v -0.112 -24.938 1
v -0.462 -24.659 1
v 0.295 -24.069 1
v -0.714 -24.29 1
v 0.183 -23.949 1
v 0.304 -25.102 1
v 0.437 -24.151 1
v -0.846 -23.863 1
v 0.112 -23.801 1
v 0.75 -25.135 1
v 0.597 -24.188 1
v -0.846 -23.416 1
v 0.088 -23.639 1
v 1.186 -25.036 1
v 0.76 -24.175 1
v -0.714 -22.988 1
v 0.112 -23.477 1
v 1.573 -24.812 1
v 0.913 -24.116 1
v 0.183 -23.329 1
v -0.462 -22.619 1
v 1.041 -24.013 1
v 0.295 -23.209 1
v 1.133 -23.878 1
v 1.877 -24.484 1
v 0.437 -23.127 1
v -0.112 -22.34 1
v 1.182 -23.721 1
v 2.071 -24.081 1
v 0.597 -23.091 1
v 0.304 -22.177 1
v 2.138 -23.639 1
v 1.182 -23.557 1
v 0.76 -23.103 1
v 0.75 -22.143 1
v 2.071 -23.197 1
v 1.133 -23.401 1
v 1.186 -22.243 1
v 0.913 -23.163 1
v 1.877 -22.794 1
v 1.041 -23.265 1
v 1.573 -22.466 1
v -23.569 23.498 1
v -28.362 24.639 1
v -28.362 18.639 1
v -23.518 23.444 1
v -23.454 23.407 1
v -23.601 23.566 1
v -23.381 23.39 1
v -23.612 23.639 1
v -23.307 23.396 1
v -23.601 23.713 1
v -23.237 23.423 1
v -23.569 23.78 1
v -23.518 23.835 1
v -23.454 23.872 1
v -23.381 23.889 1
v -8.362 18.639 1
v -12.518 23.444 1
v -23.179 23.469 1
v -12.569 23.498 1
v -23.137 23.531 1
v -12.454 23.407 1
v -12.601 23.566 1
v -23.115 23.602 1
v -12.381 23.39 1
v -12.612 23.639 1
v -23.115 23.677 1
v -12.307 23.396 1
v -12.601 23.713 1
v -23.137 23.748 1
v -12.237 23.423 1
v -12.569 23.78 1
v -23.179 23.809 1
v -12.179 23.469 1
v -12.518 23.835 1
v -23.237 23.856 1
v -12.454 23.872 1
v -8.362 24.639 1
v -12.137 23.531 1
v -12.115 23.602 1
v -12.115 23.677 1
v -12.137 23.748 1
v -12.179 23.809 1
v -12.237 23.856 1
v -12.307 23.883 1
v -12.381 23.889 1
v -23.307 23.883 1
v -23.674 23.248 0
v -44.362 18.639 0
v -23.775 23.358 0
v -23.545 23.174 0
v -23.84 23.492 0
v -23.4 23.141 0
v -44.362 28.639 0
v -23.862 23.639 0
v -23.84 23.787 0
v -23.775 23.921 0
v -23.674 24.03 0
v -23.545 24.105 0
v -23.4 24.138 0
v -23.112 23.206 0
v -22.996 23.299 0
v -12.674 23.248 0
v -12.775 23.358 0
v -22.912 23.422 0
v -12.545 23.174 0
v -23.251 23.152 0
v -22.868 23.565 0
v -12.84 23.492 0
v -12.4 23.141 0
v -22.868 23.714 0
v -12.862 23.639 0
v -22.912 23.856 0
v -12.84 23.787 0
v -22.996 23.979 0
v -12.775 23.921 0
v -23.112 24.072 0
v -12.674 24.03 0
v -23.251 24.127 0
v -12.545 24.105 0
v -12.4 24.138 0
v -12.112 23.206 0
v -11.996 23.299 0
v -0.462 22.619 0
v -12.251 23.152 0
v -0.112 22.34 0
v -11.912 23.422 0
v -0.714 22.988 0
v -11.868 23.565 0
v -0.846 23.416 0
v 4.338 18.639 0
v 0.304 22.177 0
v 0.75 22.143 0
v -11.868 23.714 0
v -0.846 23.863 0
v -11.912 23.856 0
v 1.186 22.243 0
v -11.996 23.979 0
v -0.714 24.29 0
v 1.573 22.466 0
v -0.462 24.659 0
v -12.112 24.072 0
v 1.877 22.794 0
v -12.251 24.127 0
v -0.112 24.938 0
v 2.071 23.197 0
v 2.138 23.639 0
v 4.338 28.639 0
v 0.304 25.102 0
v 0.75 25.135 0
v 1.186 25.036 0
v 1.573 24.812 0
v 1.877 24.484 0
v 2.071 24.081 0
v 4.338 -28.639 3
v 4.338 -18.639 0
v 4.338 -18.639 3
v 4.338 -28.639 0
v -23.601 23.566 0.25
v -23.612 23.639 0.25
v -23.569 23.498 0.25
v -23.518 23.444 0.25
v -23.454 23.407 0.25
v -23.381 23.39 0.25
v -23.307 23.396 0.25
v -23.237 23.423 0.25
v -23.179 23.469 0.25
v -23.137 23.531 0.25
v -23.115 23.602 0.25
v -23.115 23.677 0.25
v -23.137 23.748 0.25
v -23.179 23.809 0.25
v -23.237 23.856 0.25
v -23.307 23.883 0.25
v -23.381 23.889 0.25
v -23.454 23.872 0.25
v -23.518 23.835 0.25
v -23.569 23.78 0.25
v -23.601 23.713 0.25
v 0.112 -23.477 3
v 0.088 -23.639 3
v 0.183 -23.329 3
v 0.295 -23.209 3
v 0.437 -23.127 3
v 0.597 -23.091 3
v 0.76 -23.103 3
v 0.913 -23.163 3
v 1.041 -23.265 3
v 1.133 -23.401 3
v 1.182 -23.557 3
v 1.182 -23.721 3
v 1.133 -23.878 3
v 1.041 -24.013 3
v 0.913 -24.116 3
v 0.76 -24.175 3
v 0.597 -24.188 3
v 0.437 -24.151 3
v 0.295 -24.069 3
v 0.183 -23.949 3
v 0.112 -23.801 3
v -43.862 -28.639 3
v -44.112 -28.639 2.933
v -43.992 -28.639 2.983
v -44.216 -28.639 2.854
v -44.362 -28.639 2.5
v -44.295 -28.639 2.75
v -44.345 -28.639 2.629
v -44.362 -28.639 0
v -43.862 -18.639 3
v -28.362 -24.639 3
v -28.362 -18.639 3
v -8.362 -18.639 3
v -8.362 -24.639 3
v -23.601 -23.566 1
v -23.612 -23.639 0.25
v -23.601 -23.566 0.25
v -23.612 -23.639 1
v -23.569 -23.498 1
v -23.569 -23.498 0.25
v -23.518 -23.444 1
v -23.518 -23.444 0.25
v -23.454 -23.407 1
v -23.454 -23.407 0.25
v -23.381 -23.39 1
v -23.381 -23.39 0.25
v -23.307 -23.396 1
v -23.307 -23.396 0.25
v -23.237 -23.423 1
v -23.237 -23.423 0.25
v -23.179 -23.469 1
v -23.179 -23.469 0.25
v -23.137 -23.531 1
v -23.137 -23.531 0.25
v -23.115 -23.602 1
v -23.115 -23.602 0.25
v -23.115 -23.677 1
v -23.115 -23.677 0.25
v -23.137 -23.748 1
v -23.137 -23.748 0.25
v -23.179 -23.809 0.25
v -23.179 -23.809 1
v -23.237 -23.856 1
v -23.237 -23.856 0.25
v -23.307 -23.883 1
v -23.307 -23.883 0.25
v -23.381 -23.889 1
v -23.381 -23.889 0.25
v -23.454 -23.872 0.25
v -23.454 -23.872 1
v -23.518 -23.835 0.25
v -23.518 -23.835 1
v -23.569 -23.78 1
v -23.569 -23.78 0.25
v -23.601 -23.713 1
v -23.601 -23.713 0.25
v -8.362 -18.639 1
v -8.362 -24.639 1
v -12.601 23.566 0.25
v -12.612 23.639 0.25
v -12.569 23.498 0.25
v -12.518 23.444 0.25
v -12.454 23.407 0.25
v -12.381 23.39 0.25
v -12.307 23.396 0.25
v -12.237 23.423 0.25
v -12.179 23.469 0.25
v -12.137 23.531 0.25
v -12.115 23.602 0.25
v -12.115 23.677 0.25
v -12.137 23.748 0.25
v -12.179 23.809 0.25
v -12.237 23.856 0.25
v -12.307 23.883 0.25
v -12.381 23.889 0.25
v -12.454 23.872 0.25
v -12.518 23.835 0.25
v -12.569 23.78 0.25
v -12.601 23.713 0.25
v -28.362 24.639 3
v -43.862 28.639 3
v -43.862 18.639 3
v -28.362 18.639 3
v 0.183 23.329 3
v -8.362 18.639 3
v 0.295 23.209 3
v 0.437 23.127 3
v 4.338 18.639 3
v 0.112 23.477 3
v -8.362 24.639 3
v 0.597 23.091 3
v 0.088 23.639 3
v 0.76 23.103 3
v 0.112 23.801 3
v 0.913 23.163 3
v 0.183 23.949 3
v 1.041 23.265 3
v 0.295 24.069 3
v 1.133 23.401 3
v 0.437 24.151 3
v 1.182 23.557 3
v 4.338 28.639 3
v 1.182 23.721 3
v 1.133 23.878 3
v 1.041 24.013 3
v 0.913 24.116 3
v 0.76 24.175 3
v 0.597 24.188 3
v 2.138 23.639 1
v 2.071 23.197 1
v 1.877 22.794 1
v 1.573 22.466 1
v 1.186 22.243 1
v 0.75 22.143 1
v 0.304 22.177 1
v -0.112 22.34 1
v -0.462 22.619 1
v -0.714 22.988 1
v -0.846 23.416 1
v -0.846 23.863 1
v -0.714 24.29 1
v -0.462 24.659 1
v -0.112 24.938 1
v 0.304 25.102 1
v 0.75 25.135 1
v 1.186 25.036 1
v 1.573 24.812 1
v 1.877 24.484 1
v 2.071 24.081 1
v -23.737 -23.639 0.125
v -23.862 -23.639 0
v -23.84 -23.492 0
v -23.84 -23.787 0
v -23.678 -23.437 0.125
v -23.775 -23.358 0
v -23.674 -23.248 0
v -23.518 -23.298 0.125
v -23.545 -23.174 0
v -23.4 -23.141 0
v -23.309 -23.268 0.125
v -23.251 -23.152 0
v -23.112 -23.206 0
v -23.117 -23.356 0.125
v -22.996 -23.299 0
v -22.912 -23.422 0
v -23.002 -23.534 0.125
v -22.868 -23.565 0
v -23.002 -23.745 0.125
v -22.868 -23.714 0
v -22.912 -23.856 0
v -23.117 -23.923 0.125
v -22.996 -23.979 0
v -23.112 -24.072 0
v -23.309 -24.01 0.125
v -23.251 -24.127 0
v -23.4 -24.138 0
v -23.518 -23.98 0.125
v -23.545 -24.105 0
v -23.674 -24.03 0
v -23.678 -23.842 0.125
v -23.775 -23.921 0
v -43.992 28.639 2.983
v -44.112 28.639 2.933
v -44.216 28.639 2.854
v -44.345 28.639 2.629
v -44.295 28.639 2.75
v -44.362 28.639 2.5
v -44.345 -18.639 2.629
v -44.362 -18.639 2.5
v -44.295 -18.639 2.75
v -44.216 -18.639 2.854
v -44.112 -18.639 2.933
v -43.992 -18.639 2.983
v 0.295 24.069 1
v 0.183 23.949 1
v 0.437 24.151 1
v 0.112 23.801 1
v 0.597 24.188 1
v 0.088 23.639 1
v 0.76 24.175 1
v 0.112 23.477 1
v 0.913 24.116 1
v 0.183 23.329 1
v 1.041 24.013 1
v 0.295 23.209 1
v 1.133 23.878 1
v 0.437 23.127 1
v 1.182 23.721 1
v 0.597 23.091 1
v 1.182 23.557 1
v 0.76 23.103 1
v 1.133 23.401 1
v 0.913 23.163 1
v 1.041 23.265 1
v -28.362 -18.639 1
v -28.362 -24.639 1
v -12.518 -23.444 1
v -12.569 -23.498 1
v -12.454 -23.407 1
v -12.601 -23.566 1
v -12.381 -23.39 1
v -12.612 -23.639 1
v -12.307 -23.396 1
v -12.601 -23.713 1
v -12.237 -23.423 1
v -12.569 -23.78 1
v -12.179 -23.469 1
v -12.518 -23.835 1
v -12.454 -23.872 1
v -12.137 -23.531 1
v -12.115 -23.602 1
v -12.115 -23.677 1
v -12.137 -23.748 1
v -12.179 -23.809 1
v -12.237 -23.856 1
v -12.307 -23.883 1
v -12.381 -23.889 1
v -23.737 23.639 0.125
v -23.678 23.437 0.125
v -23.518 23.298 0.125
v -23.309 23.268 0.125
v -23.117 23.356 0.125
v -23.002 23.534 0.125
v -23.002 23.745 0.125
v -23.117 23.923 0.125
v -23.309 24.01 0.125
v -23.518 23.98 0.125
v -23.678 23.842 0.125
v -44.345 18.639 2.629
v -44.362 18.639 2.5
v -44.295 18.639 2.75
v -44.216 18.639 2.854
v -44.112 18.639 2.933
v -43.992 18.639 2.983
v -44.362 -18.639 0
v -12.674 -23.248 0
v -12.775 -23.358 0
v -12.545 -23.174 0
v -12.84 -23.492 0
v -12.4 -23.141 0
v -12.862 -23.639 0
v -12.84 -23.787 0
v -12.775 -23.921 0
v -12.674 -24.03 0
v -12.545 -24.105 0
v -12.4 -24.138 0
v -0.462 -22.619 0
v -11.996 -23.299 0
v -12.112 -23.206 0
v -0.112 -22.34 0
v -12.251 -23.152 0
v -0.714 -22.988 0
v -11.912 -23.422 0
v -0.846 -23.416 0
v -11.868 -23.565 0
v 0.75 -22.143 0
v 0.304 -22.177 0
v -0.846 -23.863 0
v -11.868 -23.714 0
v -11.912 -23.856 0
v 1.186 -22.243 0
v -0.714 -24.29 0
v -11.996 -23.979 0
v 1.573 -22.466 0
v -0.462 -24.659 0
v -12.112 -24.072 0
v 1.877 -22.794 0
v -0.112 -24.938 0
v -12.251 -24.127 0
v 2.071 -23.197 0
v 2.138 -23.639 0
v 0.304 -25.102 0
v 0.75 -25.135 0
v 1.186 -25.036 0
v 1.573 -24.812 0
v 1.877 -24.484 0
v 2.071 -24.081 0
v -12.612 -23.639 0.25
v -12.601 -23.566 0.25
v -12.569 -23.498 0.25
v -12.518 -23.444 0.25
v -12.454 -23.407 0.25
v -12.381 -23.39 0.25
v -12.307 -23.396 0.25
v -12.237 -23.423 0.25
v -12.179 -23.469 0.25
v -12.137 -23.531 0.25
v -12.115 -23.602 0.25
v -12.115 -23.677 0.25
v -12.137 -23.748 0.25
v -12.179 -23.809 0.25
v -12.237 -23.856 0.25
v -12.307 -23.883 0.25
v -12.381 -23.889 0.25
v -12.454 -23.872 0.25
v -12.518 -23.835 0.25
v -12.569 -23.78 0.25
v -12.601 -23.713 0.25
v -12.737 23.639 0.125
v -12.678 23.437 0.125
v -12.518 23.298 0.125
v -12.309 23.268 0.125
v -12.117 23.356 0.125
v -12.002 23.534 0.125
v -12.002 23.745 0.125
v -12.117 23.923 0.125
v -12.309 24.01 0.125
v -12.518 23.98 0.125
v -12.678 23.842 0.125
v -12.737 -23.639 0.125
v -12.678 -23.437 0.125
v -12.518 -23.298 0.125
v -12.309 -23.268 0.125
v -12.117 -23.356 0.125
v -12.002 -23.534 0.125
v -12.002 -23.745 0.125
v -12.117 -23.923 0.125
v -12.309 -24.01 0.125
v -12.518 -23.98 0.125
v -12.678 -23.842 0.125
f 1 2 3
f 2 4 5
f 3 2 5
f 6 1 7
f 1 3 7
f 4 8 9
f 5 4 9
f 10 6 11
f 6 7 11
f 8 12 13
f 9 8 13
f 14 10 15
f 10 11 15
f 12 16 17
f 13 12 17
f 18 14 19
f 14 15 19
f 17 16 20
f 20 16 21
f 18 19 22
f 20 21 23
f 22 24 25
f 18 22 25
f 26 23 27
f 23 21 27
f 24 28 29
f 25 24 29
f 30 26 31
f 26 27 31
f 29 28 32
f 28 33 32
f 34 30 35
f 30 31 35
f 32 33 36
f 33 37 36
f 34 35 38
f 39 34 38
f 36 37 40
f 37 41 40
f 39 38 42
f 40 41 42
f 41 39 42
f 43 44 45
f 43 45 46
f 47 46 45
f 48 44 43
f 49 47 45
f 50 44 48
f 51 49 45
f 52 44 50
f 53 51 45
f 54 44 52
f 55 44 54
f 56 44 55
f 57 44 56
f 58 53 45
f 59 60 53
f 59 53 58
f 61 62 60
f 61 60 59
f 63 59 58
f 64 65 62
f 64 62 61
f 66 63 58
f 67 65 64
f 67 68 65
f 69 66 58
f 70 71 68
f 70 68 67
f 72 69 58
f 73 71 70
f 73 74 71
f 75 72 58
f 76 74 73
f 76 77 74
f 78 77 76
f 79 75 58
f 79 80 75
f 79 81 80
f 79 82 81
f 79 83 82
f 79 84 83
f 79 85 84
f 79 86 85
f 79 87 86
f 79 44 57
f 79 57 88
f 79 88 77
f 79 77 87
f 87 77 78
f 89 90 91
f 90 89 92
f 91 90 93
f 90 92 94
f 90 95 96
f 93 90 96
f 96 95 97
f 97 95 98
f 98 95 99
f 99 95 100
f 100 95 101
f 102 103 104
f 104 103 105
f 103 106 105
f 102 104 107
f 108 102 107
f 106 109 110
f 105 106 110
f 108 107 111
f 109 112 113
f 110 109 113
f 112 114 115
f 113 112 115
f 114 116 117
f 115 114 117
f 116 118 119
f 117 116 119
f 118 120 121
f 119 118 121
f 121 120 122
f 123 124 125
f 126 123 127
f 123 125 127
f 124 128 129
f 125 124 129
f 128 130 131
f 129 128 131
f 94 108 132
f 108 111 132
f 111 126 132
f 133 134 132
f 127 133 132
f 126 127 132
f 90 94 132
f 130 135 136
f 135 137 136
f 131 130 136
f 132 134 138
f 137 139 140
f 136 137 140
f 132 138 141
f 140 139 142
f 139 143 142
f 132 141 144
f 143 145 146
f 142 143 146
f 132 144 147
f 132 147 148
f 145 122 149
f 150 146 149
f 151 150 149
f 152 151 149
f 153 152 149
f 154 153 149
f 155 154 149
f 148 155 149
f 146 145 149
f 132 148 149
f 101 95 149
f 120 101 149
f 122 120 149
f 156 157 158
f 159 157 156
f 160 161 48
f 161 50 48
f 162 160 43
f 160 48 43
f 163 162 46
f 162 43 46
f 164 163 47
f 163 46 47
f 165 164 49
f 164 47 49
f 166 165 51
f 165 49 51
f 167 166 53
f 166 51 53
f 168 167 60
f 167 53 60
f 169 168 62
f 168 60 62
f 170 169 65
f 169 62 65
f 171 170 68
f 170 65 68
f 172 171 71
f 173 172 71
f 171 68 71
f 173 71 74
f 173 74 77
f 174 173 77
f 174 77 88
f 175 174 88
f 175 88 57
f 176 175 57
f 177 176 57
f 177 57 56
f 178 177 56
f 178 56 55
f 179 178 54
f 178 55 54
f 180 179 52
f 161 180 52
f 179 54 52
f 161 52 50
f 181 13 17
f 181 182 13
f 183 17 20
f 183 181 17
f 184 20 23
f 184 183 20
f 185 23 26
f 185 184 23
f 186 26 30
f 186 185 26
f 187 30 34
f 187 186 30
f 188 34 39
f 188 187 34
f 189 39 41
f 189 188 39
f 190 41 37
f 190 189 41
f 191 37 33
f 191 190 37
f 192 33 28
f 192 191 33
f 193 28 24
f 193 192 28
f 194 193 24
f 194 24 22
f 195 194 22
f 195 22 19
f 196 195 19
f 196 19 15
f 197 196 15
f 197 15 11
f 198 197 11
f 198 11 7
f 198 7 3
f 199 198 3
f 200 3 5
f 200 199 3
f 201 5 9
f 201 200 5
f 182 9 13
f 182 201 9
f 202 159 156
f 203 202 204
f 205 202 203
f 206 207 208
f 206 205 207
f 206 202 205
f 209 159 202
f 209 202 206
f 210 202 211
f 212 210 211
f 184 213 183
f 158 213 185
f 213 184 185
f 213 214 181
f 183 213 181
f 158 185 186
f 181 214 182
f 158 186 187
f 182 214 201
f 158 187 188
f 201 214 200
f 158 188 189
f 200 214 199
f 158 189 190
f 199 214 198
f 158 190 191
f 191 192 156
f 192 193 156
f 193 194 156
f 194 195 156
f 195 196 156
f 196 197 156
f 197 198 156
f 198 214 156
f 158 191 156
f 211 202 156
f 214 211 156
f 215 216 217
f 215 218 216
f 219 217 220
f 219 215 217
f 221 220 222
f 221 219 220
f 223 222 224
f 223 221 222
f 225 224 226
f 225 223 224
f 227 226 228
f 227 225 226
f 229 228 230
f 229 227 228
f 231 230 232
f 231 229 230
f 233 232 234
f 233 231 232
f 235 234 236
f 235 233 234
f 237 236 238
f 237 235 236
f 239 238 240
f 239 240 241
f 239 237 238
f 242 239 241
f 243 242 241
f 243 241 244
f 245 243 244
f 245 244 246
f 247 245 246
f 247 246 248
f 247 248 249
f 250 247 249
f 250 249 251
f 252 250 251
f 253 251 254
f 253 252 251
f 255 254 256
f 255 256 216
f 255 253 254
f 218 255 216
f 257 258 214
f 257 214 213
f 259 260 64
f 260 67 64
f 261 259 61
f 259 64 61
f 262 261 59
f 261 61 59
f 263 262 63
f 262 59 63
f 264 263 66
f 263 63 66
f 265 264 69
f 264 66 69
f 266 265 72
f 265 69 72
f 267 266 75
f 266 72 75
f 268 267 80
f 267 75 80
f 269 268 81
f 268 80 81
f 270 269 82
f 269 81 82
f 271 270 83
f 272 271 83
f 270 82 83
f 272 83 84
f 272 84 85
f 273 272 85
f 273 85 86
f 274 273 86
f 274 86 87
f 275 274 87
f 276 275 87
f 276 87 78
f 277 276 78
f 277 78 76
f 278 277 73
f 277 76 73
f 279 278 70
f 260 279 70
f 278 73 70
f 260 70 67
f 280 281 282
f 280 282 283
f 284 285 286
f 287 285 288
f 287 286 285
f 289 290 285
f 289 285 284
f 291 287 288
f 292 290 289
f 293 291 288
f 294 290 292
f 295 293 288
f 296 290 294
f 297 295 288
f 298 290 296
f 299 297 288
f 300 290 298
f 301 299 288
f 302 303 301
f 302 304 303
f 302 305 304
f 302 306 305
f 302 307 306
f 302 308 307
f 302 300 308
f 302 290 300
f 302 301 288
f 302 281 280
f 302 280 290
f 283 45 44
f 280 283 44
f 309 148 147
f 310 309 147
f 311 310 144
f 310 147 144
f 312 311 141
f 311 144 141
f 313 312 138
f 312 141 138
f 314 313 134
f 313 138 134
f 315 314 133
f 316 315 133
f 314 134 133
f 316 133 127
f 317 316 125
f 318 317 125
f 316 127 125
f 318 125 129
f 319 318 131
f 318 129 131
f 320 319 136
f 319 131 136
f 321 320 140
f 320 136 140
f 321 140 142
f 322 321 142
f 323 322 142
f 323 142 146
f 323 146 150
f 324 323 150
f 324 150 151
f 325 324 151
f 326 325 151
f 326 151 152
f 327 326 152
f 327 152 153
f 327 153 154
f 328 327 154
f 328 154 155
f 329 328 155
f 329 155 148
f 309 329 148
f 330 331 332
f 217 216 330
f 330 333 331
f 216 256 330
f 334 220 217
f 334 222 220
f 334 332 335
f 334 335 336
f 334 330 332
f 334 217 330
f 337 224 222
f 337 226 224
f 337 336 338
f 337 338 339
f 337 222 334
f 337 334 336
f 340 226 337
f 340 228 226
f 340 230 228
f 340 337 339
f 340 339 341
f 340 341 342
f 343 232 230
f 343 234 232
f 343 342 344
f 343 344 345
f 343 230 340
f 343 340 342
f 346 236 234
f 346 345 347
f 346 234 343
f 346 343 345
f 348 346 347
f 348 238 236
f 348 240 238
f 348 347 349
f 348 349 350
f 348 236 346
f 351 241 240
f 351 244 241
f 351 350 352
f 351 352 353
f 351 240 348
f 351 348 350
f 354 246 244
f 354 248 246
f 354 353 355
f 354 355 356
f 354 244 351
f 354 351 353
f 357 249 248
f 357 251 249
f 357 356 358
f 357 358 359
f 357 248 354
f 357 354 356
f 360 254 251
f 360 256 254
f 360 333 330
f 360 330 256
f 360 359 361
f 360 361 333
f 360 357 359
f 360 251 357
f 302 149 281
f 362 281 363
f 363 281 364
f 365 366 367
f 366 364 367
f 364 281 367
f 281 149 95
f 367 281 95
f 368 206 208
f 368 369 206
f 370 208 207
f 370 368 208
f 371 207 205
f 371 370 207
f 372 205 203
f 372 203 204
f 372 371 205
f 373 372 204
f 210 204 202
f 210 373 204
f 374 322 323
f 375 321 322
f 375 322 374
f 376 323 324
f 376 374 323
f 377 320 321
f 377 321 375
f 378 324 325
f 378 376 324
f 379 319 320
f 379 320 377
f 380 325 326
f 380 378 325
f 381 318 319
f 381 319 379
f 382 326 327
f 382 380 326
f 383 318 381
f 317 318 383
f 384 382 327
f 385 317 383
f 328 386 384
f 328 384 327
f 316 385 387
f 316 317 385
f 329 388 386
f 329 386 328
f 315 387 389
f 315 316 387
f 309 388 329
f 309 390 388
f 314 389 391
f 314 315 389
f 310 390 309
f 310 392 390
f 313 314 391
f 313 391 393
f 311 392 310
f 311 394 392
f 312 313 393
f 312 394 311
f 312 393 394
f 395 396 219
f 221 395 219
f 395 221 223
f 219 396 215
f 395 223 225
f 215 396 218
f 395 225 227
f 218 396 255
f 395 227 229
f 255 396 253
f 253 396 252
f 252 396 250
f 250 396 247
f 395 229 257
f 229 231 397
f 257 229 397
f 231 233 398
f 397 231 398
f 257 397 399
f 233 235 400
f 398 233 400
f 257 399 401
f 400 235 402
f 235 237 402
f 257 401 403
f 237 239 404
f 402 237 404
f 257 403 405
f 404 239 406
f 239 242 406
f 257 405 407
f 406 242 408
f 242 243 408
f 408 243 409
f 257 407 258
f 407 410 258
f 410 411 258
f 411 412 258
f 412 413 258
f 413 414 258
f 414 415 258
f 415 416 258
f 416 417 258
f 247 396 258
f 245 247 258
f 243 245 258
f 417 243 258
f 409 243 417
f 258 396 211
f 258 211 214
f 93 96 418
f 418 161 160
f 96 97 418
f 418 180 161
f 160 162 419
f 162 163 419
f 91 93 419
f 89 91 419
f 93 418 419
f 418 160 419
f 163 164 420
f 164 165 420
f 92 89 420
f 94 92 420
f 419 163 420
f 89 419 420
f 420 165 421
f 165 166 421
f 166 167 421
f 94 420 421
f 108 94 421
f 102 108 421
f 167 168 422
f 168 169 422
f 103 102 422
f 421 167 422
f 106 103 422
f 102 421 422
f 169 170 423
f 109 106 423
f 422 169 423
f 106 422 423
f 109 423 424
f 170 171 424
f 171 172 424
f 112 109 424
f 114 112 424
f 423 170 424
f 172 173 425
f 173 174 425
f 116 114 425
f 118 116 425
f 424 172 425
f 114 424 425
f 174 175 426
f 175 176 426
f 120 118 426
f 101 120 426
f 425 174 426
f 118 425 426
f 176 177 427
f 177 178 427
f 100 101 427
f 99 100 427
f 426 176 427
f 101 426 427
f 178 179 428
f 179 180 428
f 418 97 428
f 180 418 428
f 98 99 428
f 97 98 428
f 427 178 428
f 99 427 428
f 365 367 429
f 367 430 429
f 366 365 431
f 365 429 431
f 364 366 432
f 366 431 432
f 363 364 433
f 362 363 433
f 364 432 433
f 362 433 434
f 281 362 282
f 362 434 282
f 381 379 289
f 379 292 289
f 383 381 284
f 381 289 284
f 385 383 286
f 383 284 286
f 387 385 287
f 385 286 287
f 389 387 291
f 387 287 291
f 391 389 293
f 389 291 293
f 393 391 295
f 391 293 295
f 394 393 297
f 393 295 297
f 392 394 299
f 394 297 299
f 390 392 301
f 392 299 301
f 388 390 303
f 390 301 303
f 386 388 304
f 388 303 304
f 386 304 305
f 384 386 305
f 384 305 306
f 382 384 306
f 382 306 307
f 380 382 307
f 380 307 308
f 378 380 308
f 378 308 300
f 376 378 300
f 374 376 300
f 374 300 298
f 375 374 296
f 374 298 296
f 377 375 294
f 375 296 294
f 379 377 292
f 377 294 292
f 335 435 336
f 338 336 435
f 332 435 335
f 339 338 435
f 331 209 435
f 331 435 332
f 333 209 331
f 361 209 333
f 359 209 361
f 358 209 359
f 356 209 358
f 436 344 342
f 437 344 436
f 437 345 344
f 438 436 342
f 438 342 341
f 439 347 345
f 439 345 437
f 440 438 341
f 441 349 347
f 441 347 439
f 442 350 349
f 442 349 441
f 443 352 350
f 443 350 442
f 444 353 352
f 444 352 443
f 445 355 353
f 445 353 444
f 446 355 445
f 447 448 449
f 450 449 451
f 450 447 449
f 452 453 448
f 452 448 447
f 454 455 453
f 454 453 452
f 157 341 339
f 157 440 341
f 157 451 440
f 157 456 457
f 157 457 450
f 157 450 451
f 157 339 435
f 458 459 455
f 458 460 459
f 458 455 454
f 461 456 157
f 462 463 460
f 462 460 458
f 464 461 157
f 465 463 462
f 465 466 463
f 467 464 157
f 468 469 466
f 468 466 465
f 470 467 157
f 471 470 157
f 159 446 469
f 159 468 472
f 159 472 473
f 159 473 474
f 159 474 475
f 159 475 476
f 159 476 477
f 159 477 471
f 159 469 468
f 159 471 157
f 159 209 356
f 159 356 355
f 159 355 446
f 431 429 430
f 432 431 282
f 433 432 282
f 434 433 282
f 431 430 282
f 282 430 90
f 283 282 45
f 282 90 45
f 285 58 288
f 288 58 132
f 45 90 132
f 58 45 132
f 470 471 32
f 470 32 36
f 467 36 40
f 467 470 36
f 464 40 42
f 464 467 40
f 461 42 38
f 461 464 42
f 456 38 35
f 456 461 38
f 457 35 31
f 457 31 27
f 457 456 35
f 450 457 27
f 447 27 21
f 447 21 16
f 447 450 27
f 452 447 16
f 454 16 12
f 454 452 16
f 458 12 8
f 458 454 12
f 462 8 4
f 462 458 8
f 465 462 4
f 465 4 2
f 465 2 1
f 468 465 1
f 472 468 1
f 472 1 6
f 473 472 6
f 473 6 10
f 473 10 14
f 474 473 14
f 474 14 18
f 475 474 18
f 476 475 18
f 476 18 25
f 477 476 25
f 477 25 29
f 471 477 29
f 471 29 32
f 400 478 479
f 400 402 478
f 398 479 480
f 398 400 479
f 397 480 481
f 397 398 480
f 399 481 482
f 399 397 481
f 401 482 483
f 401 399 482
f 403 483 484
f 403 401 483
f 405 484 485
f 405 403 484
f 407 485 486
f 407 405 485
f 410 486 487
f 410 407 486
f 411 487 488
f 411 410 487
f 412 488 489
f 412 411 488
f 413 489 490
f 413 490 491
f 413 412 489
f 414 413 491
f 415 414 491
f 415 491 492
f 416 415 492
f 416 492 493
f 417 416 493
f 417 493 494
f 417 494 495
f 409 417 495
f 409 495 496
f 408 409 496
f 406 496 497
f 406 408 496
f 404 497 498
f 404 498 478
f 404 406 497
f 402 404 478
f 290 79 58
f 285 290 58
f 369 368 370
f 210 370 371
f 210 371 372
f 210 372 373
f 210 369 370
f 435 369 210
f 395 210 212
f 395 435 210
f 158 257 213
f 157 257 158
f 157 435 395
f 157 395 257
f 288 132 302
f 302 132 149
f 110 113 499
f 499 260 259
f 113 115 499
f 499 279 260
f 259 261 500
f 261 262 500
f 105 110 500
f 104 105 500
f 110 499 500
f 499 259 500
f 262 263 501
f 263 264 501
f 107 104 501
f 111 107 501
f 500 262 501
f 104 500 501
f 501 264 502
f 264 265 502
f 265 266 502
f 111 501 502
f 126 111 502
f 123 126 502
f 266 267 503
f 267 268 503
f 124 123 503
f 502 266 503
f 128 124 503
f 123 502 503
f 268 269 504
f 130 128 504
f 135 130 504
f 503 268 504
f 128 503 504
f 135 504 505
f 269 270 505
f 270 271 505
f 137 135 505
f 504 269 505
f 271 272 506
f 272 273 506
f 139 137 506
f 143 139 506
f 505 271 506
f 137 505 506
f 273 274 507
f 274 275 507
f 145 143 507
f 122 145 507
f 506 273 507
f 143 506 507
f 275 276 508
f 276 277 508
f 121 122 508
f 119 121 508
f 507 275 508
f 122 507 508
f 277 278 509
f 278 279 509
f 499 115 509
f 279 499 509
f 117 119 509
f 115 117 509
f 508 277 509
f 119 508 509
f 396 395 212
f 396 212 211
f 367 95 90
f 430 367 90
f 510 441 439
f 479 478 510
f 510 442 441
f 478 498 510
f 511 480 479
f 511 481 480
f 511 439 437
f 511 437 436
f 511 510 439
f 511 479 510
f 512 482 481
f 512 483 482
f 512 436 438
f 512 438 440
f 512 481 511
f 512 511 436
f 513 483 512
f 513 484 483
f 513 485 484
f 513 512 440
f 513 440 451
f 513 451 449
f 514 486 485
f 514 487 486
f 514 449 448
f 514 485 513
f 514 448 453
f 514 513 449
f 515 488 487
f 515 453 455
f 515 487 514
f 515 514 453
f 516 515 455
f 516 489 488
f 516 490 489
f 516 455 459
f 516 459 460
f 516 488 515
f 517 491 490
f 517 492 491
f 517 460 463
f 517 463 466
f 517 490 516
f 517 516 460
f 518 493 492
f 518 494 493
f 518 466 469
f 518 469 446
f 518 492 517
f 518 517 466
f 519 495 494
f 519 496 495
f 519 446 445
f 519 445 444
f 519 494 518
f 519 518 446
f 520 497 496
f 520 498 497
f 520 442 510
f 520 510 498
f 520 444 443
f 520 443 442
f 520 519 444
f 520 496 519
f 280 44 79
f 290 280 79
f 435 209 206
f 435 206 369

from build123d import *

# Parameters (mm, degrees)
F1_DEPTH       = 3
F0_W           = 20
F0_H           = 6
F2_DEPTH       = 1
F3_D           = 0.5
F3_CSINK_D     = 1
F3_CSINK_ANGLE = 90
F4_D           = 1.1
F4_CBORE_D     = 3
F4_CBORE_DEPTH = 1
F5_R           = 0.5


with BuildPart() as f1:
    # F0 (on Top) → F1 (new body)
    with BuildSketch(Plane.XY):
        Polygon((-44.3622941555, 28.6392407678), (-44.3622941555, 18.6392407678), (-28.3622941555, 18.6392407678), (-28.3622941555, 24.6392407678), (-8.3622941555, 24.6392407678), (-8.3622941555, 18.6392407678), (4.3377058445, 18.6392407678), (4.3377058445, 28.6392407678), align=None)
    extrude(amount=F1_DEPTH)

    # F0 (on Top) → F2 (join)
    with BuildSketch(Plane.XY):
        with Locations((-18.3622941555, 21.6392407678)):
            Rectangle(F0_W, F0_H)
    extrude(amount=F2_DEPTH)

    # F3 (through all)
    with Locations(Plane(origin=(0, 0, 0), x_dir=(1, 0, 0), z_dir=(0, 0, -1))):
        with Locations((-23.3622941555, -23.6392407678), (-12.3622941555, -23.6392407678)):
            CounterSinkHole(F3_D / 2, F3_CSINK_D / 2, counter_sink_angle=F3_CSINK_ANGLE)

    # F4 (through all)
    with Locations(Plane(origin=(0, 0, 0), x_dir=(1, 0, 0), z_dir=(0, 0, -1))):
        with Locations((0.6377058445, -23.6392407678)):
            CounterBoreHole(F4_D / 2, F4_CBORE_D / 2, F4_CBORE_DEPTH)

    # F5
    f5_edges = [f1.edges().sort_by_distance(p)[0] for p in [
        (-44.362294, 23.639241, 3),
    ]]
    fillet(f5_edges, radius=F5_R)


with BuildPart() as f6_1:
    # F6: instance of F1
    add(f1.part.mirror(Plane.XZ))


solid = Compound([f1.part, f6_1.part])
